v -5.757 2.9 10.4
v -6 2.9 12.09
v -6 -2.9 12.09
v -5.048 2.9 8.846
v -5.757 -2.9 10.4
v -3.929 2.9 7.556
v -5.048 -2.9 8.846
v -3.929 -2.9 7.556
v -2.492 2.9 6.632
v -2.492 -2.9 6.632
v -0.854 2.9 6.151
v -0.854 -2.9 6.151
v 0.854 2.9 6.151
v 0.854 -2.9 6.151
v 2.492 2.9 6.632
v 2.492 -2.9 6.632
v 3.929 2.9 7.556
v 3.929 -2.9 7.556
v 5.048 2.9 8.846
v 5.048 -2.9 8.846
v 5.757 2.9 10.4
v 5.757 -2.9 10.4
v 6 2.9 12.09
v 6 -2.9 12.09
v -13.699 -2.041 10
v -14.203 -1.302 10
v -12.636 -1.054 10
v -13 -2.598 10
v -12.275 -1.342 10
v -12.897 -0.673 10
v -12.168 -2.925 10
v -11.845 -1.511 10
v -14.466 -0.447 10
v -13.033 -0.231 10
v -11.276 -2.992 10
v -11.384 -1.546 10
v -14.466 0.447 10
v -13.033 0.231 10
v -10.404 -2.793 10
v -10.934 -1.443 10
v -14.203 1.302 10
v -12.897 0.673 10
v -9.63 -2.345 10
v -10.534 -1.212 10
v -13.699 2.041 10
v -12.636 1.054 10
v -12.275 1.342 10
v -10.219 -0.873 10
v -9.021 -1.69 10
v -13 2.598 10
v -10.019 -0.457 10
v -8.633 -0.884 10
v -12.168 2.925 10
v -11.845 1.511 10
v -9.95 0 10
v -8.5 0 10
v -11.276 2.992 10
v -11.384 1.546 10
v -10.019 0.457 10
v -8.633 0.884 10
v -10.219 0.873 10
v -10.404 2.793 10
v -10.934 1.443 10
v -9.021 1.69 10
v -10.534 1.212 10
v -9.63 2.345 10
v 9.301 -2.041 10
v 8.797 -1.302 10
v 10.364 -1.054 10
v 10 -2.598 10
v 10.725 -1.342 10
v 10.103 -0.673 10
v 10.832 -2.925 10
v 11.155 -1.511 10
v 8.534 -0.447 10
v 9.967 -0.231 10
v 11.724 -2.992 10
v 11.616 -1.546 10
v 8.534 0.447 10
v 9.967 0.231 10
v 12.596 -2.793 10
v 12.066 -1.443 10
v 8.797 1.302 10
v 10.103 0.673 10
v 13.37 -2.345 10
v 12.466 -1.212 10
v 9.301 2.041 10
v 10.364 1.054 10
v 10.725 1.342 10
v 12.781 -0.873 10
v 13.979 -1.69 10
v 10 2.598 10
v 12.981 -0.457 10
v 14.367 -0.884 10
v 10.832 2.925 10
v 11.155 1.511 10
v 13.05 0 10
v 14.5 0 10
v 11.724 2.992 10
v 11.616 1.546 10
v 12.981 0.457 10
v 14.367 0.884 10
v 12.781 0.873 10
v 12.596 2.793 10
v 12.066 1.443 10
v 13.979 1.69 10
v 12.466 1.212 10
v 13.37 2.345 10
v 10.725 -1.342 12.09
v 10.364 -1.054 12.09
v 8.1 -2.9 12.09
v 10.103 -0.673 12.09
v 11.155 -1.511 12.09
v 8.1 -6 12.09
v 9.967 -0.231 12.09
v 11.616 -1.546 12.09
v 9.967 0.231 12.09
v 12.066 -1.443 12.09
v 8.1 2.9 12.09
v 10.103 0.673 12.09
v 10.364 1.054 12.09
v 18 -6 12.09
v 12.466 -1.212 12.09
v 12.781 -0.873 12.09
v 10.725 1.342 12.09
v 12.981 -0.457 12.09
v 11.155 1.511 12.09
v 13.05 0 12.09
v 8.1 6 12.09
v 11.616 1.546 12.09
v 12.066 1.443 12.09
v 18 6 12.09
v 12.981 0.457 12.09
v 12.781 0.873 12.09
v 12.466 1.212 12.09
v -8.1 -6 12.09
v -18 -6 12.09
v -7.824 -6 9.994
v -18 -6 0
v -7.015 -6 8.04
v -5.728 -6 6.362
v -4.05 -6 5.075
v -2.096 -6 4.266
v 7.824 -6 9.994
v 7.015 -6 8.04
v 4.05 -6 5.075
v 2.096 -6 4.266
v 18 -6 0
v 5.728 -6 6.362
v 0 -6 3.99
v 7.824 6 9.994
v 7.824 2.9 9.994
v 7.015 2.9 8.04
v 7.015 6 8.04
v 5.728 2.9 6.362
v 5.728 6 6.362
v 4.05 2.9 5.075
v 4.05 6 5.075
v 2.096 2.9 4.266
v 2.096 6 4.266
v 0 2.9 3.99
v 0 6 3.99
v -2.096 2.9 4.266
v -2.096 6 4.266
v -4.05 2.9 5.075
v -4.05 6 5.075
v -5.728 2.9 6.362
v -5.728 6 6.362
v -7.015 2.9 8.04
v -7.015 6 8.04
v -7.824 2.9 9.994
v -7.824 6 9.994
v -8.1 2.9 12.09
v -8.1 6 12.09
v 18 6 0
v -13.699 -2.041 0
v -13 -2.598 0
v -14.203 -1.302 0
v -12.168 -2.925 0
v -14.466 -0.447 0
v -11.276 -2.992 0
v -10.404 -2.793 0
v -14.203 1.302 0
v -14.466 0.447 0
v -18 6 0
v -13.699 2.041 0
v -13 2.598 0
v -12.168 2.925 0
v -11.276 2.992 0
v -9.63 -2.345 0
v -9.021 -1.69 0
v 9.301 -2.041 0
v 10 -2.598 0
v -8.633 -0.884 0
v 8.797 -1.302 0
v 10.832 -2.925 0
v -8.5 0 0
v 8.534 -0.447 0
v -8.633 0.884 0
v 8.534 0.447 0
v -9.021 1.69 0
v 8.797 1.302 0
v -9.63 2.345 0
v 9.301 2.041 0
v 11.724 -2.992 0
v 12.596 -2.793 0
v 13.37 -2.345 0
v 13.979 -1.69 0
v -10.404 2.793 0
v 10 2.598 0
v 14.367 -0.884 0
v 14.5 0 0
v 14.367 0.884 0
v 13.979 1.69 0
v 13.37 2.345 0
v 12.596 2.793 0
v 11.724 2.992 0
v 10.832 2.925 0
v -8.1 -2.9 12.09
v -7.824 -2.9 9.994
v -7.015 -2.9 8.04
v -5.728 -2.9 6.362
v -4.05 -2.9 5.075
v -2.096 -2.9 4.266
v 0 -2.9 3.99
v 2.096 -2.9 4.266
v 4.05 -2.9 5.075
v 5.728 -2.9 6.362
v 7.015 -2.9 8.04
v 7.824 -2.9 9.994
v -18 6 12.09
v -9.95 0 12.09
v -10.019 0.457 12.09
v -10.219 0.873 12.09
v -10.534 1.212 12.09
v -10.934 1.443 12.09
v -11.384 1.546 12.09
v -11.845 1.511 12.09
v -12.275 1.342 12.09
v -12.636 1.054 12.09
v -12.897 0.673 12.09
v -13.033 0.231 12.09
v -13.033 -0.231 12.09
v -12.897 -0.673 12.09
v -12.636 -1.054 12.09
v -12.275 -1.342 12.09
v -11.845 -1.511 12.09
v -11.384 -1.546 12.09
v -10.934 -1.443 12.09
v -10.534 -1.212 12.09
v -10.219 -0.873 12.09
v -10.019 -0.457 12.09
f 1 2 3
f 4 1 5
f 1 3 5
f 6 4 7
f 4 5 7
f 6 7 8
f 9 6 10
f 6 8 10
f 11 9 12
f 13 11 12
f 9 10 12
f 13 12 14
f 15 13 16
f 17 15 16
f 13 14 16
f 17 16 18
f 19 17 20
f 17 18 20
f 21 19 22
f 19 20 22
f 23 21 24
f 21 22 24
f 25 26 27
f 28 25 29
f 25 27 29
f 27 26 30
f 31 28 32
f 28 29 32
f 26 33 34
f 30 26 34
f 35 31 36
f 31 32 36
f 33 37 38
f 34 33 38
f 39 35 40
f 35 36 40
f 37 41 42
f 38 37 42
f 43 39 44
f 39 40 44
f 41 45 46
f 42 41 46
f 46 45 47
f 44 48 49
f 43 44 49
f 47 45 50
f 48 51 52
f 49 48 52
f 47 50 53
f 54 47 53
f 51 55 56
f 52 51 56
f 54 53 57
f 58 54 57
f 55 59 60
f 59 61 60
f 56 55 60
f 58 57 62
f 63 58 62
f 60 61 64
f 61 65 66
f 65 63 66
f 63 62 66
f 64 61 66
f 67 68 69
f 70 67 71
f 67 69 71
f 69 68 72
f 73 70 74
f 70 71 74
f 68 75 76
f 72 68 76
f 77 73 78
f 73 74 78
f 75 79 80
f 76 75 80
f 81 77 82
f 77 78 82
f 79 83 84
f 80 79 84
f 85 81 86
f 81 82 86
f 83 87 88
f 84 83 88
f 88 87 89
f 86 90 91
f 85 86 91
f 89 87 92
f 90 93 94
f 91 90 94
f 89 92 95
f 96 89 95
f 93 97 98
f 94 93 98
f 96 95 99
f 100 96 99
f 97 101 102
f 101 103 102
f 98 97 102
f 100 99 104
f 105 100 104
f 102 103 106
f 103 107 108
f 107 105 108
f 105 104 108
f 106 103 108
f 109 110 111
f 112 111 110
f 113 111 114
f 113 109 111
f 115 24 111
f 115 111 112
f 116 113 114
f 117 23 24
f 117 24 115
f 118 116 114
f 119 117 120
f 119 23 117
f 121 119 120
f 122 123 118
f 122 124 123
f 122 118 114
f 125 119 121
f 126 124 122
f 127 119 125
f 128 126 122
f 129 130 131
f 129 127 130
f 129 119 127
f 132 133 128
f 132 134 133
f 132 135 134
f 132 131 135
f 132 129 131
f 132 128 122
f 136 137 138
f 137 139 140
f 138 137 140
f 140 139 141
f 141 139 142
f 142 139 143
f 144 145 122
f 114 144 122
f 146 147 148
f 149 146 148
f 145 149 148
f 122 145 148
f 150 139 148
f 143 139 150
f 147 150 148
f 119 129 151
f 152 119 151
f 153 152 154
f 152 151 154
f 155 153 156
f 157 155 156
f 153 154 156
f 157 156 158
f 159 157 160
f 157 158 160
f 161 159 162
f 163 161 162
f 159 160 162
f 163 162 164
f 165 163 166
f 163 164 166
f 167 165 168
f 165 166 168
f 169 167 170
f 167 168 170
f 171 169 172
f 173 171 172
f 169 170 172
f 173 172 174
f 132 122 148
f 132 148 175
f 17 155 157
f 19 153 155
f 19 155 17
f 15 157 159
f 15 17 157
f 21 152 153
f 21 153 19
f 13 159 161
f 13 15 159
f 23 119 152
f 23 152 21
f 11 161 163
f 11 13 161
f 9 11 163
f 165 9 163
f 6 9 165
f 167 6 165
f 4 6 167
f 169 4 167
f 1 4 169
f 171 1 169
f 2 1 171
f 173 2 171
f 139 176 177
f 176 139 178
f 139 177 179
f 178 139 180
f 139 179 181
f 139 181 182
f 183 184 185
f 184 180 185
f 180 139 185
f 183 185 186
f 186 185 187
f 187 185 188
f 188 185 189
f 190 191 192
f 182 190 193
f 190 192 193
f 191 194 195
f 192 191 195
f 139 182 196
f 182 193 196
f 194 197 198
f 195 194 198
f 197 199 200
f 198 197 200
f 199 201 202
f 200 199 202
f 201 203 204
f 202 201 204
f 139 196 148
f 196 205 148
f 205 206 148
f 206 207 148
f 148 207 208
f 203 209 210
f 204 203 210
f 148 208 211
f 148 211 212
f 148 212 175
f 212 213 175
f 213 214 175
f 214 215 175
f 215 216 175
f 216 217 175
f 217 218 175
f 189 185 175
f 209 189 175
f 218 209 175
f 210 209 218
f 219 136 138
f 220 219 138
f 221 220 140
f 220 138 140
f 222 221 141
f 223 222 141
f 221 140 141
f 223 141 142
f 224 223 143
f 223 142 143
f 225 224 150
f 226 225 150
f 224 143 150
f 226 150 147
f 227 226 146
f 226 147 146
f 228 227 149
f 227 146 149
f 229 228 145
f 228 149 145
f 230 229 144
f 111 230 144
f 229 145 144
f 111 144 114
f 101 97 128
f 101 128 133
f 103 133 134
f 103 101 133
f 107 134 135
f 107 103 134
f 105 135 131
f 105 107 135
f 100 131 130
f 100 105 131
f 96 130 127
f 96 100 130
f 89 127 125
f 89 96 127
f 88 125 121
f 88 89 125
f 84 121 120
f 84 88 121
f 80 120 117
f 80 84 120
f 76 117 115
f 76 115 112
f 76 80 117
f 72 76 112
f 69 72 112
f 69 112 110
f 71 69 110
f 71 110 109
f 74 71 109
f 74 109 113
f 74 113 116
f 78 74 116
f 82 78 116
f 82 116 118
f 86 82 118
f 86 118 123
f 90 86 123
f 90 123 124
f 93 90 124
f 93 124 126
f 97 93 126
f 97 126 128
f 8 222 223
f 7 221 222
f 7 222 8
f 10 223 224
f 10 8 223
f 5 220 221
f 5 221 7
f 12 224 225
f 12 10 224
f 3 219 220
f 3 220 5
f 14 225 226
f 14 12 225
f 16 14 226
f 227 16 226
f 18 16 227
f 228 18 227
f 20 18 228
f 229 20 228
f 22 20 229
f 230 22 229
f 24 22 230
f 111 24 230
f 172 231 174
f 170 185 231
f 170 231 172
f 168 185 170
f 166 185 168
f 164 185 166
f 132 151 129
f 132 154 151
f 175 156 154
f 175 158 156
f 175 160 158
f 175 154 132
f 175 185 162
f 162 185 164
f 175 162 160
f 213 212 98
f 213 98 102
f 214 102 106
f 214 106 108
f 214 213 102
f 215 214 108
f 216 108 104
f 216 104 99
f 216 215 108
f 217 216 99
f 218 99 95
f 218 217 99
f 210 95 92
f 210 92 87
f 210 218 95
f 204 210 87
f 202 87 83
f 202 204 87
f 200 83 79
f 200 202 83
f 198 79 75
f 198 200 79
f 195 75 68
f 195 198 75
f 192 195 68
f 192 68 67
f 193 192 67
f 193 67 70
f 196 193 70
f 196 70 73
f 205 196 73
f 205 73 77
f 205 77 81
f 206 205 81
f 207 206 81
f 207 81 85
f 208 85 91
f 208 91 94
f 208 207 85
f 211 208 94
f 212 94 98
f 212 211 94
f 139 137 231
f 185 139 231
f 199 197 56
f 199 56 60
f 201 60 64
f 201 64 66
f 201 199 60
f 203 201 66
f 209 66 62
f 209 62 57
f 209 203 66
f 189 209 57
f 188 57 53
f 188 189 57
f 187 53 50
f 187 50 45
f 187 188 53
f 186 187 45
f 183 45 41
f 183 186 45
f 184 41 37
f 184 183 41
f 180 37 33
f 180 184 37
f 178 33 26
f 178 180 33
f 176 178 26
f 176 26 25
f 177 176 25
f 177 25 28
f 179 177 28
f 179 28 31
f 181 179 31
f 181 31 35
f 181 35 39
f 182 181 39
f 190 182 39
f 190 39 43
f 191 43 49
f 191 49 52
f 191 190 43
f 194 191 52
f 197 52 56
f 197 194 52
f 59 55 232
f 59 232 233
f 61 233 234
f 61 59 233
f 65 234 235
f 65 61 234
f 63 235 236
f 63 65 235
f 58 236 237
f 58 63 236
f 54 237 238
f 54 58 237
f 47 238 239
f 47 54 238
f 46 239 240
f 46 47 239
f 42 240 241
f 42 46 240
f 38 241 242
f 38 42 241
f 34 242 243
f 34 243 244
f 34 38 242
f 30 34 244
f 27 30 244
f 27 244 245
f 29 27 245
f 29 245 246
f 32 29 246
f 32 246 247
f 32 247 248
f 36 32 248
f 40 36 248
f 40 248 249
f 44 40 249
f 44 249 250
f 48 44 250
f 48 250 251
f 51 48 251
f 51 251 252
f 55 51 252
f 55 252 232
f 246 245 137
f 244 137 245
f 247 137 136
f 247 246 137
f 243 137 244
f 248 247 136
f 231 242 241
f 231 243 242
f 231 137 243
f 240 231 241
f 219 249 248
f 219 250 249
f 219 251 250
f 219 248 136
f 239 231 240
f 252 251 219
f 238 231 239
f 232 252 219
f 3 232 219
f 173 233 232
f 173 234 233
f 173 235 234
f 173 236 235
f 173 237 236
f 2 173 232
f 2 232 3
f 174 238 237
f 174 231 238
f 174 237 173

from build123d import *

# Parameters (mm, degrees)
F0_W     = 36
F0_H     = 12
F0_R     = 3
F0_R_2   = 1.55
F1_DEPTH = 12.09
F2_DEPTH = 10
F4_DEPTH = 12
F5_DEPTH = 3.1
F7_DEPTH = 3.1


with BuildPart() as f1:
    # F0 (on Top) → F1 (new body)
    with BuildSketch(Plane.XY):
        Rectangle(F0_W, F0_H)
        with Locations((-11.5, 0)):
            Circle(F0_R, mode=Mode.SUBTRACT)
        with Locations((11.5, 0)):
            Circle(F0_R, mode=Mode.SUBTRACT)
        with Locations((11.5, 0)):
            Circle(F0_R)
        with Locations((11.5, 0)):
            Circle(F0_R_2, mode=Mode.SUBTRACT)
        with Locations((-11.5, 0)):
            Circle(F0_R)
        with Locations((-11.5, 0)):
            Circle(F0_R_2, mode=Mode.SUBTRACT)
    extrude(amount=F1_DEPTH)

    # F0 (on Top) → F2 (cut)
    with BuildSketch(Plane.XY):
        with Locations((-11.5, 0)):
            Circle(F0_R)
        with Locations((-11.5, 0)):
            Circle(F0_R_2, mode=Mode.SUBTRACT)
        with Locations((11.5, 0)):
            Circle(F0_R)
        with Locations((11.5, 0)):
            Circle(F0_R_2, mode=Mode.SUBTRACT)
    extrude(amount=F2_DEPTH, mode=Mode.SUBTRACT)

    # F3 (on face) → F4 (cut, through all)
    with BuildSketch(Plane.XZ.offset(6)):
        with BuildLine():
            Line((6, 12.09), (-6, 12.09))
            ThreePointArc((-6, 12.09), (0, 6.09), (6, 12.09))
        make_face()
    extrude(amount=-F4_DEPTH, mode=Mode.SUBTRACT)

    # F3 (on face) → F5 (cut)
    with BuildSketch(Plane.XZ.offset(6)):
        with BuildLine():
            Line((-6, 12.09), (-8.1, 12.09))
            ThreePointArc((-8.1, 12.09), (0, 3.99), (8.1, 12.09))
            Line((8.1, 12.09), (6, 12.09))
            ThreePointArc((6, 12.09), (0, 6.09), (-6, 12.09))
        make_face()
    extrude(amount=-F5_DEPTH, mode=Mode.SUBTRACT)

    # F6 (on face) → F7 (cut)
    with BuildSketch(Plane(origin=(0, 6, 0), x_dir=(-1, 0, 0), z_dir=(0, 1, 0))):
        with BuildLine():
            Line((-6, 12.09), (-8.1, 12.09))
            ThreePointArc((-8.1, 12.09), (0, 3.99), (8.1, 12.09))
            Line((8.1, 12.09), (6, 12.09))
            ThreePointArc((6, 12.09), (0, 6.09), (-6, 12.09))
        make_face()
    extrude(amount=-F7_DEPTH, mode=Mode.SUBTRACT)


solid = f1.part
